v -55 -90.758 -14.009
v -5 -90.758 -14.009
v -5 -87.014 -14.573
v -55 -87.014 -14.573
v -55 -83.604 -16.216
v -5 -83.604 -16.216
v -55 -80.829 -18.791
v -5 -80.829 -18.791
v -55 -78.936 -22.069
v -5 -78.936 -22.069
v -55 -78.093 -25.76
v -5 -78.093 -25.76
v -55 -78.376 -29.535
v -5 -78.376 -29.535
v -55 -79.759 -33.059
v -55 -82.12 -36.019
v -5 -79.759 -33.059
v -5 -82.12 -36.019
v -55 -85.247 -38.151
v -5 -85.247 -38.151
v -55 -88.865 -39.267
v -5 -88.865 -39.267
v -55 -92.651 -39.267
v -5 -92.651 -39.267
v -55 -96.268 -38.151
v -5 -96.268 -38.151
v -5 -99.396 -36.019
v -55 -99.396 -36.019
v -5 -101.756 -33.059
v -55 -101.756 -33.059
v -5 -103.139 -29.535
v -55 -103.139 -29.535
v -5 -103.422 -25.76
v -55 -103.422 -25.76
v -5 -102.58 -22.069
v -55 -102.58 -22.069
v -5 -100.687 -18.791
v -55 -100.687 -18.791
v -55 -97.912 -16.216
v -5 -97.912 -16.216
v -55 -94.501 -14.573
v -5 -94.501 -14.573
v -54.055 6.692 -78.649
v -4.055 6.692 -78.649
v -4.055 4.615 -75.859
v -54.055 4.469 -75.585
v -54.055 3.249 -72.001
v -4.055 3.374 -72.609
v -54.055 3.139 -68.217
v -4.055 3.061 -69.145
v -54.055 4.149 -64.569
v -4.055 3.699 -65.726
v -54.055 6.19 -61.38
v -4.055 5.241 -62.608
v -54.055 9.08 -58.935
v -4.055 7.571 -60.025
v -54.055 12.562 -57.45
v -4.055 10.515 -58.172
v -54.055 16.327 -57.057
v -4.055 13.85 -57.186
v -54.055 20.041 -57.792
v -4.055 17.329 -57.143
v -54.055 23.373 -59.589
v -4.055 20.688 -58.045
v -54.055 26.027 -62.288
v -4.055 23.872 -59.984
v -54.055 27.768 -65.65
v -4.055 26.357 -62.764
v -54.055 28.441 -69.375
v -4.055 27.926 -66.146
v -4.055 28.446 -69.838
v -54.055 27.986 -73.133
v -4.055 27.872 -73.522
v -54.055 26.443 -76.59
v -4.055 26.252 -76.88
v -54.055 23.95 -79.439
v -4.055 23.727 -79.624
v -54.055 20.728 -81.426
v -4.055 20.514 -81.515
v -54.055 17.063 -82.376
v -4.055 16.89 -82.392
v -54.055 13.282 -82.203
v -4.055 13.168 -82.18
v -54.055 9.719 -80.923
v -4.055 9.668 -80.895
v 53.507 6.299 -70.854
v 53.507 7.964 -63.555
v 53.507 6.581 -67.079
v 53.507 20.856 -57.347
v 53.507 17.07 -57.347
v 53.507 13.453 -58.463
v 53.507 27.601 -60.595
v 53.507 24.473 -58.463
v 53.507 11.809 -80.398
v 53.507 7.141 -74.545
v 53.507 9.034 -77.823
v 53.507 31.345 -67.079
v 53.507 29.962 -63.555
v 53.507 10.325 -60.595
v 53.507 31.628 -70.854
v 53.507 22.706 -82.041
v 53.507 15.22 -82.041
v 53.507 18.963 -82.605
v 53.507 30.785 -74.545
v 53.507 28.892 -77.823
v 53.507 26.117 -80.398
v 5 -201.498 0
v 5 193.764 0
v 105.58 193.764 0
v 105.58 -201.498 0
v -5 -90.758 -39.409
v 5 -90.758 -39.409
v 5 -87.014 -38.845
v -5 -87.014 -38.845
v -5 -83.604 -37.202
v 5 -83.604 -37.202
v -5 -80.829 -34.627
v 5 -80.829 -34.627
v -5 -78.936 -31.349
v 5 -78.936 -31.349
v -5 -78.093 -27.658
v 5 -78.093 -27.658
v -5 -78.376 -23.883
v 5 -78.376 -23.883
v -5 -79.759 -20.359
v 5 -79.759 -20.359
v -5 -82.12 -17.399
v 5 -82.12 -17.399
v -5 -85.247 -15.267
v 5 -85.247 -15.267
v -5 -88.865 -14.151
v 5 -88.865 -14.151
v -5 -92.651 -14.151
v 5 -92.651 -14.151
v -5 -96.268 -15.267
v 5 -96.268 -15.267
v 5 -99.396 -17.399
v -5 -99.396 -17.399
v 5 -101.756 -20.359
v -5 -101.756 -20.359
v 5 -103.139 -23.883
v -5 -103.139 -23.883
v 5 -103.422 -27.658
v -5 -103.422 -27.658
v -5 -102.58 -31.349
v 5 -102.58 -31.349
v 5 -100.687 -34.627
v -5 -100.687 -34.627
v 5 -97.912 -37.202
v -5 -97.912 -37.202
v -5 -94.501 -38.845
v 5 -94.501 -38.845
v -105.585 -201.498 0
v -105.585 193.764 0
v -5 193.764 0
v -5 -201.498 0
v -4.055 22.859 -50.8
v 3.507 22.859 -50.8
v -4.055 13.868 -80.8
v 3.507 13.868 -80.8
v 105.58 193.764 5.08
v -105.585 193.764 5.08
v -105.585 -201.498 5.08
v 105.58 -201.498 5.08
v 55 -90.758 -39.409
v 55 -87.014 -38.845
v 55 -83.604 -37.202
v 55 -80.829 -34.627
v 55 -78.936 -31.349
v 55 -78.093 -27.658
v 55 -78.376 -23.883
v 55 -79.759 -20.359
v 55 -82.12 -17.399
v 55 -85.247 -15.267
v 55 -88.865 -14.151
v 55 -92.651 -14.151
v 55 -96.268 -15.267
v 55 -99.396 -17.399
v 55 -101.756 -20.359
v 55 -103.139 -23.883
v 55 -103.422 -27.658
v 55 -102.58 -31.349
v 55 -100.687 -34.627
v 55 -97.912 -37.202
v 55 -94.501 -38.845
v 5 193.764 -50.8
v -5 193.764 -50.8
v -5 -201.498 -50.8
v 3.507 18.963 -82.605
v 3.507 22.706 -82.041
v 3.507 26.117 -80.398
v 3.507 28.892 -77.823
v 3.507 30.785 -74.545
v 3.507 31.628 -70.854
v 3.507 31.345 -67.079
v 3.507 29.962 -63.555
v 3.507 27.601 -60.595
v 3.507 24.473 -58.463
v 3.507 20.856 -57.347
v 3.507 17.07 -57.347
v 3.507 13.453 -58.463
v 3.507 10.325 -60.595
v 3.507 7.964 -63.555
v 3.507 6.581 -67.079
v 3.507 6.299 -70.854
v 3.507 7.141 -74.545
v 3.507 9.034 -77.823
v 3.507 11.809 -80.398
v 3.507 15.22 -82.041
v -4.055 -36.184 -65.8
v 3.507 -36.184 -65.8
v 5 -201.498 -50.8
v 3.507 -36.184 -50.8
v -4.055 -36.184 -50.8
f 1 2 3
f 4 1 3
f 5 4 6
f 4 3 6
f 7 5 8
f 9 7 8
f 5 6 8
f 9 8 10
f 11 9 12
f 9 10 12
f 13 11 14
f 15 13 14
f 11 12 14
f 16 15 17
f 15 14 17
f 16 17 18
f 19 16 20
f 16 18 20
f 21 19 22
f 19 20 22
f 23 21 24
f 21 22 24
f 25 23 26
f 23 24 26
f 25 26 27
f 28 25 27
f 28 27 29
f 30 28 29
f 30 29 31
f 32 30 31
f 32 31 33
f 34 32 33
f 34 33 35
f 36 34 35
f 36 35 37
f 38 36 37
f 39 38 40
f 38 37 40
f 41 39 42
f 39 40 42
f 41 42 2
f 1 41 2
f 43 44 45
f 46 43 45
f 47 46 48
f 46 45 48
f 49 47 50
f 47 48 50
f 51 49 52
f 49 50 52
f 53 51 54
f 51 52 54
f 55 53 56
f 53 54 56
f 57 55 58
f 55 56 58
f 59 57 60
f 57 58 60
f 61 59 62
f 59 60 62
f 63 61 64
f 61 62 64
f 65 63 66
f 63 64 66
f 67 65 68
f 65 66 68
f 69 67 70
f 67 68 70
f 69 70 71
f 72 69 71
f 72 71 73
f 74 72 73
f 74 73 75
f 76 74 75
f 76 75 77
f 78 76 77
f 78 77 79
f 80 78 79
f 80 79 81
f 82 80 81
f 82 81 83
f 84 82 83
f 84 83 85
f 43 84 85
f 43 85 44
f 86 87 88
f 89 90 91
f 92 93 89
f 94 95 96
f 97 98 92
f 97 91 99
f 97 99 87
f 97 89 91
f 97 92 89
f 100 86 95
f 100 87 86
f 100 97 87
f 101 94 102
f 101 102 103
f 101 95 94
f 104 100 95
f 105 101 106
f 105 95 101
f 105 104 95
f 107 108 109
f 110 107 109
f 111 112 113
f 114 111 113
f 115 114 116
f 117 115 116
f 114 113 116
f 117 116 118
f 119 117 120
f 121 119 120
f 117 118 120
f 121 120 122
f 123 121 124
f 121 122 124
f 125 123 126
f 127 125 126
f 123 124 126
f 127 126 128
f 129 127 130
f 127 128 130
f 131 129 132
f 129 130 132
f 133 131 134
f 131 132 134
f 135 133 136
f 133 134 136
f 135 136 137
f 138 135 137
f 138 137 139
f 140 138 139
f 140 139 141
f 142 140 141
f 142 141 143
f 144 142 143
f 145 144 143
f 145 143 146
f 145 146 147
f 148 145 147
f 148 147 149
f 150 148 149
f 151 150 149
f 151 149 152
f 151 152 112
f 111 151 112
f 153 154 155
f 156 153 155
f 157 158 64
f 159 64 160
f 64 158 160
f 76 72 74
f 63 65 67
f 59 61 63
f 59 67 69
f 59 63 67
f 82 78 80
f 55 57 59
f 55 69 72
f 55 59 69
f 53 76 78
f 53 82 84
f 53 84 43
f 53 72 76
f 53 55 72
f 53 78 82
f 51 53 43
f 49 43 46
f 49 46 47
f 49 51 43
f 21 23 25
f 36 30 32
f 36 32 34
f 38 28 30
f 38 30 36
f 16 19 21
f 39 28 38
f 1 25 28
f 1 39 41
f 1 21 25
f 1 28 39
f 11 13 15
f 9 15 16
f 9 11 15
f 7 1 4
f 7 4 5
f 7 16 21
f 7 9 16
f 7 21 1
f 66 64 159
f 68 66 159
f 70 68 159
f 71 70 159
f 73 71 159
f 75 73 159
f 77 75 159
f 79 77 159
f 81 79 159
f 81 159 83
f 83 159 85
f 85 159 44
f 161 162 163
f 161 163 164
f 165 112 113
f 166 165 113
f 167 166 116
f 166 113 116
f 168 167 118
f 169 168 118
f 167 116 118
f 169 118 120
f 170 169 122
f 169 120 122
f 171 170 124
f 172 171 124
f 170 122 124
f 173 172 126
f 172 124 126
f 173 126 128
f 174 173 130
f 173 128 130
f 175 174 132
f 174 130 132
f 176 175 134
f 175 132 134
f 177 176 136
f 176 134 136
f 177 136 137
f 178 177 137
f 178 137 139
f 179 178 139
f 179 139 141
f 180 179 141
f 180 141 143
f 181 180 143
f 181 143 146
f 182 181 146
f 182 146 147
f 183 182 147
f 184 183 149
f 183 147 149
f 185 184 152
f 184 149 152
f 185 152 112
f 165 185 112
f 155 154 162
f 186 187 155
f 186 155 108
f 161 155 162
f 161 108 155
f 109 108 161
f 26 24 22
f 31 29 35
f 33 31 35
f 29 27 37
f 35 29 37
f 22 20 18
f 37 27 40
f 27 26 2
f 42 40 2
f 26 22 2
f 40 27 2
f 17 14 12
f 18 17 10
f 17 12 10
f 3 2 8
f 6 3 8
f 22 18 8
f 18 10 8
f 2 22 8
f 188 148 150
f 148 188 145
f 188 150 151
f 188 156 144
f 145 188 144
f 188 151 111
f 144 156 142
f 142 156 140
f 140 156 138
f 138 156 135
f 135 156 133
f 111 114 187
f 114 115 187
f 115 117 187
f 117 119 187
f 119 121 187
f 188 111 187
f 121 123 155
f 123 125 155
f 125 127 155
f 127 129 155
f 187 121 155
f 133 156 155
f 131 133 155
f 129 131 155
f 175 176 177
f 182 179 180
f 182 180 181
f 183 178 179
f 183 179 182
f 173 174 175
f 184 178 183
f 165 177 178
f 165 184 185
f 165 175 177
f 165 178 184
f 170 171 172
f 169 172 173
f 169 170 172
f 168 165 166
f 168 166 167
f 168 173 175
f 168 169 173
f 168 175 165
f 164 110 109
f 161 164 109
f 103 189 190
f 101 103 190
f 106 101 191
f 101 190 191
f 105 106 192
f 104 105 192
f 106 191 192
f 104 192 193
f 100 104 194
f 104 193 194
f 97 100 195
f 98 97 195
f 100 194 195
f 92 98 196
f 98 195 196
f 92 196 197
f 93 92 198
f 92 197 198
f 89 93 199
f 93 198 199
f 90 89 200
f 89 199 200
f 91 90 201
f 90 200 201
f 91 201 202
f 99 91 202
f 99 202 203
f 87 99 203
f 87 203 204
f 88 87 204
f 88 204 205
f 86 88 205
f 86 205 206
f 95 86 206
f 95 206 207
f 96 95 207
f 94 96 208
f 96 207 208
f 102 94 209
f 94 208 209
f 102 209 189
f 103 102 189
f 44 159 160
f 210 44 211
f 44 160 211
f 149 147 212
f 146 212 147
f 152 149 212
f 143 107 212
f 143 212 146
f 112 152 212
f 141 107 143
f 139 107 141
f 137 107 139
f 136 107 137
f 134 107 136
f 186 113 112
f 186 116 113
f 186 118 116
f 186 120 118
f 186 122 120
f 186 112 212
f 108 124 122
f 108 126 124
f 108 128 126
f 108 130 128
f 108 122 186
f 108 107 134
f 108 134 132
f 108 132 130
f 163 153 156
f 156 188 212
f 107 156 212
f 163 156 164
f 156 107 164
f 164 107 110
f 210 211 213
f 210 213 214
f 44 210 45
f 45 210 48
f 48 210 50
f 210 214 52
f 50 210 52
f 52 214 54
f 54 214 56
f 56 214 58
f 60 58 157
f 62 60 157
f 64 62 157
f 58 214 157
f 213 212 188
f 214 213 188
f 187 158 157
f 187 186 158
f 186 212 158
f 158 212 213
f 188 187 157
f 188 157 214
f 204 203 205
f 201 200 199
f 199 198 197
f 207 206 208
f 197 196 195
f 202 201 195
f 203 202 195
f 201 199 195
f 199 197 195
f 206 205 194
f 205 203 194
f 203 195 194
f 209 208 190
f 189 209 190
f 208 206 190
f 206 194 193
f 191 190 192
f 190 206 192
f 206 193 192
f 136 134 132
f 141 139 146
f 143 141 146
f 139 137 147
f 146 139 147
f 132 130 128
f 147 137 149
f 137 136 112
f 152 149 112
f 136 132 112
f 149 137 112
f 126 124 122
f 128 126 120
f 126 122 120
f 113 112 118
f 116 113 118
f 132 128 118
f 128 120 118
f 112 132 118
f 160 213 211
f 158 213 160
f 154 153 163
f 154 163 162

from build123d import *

# Parameters (mm, degrees)
SKETCH1_W           = 211.164618672
SKETCH1_H           = 395.262656468
BOSS_EXTRUDE1_DEPTH = 5.08
SKETCH2_W           = 10
SKETCH2_H           = 395.262656468
BOSS_EXTRUDE2_DEPTH = 50.8
SKETCH3_R           = 12.7
CUT_EXTRUDE1_DEPTH  = 15
SKETCH5_W           = 7.562322901
SKETCH5_H           = 100.104165791
BOSS_EXTRUDE3_DEPTH = 30
CUT_EXTRUDE4_DEPTH  = 20
SKETCH13_R          = 12.7
BOSS_EXTRUDE4_DEPTH = 50
SKETCH15_R          = 12.7
BOSS_EXTRUDE5_DEPTH = 50
SKETCH16_R          = 12.7
BOSS_EXTRUDE6_DEPTH = 50
SKETCH17_R          = 12.7
BOSS_EXTRUDE7_DEPTH = 50


with BuildPart() as part:
    # Sketch1 → Boss-Extrude1 (new body)
    with BuildSketch(Plane.XY):
        with Locations((-0.002292742, -3.867122219)):
            Rectangle(SKETCH1_W, SKETCH1_H)
    extrude(amount=BOSS_EXTRUDE1_DEPTH)

    # Sketch2 → Boss-Extrude2 (add)
    with BuildSketch(Plane(origin=(0, 0, 0), x_dir=(-1, 0, 0), z_dir=(0, 0, -1))):
        with Locations((0, -3.867122219)):
            Rectangle(SKETCH2_W, SKETCH2_H)
    extrude(amount=BOSS_EXTRUDE2_DEPTH)

    # Sketch3 → Cut-Extrude1 (cut)
    with BuildSketch(Plane(origin=(5, 0, 0), x_dir=(0, 0, -1), z_dir=(1, 0, 0))):
        with Locations((26.709107081, -90.757809842)):
            Circle(SKETCH3_R)
    extrude(amount=-CUT_EXTRUDE1_DEPTH, mode=Mode.SUBTRACT)

    # Sketch5 → Boss-Extrude3 (add)
    with BuildSketch(Plane(origin=(0, 0, -50.8), x_dir=(-1, 0, 0), z_dir=(0, 0, -1))):
        with Locations((0.273809221, 13.868484909)):
            Rectangle(SKETCH5_W, SKETCH5_H)
    extrude(amount=BOSS_EXTRUDE3_DEPTH)

    # Sketch12 → Cut-Extrude4 (cut)
    with BuildSketch(Plane(origin=(3.50735223, 0, 0), x_dir=(0, 0, -1), z_dir=(1, 0, 0))):
        Polygon((80.8, 13.868484908), (65.8, -36.183597987), (80.8, -36.183597987), align=None)
        Polygon((50.8, 22.859119742), (80.8, 13.868484908), (80.8, 63.920567804), (50.8, 63.920567804), align=None)
    extrude(amount=-CUT_EXTRUDE4_DEPTH, mode=Mode.SUBTRACT)

    # Sketch13 → Boss-Extrude4 (add)
    with BuildSketch(Plane.ZY.offset(4.054970671)):
        with Locations(Location((-69.744112894, 15.746525461, 0), (0, 0, 225.477498296))):
            Circle(SKETCH13_R)
    extrude(amount=BOSS_EXTRUDE4_DEPTH)


with BuildPart() as body_2:
    # Sketch15 → Boss-Extrude5 (new body)
    with BuildSketch(Plane(origin=(3.50735223, 0, 0), x_dir=(0, 0, -1), z_dir=(1, 0, 0))):
        with Locations((69.904821155, 18.963016363)):
            Circle(SKETCH15_R)
    extrude(amount=BOSS_EXTRUDE5_DEPTH)


with BuildPart() as body_3:
    # Sketch16 → Boss-Extrude6 (new body)
    with BuildSketch(Plane(origin=(5, 0, 0), x_dir=(0, 0, -1), z_dir=(1, 0, 0))):
        with Locations((26.709107081, -90.757809842)):
            Circle(SKETCH16_R)
    extrude(amount=BOSS_EXTRUDE6_DEPTH)


with BuildPart() as body_4:
    # Sketch17 → Boss-Extrude7 (new body)
    with BuildSketch(Plane.ZY.offset(5)):
        with Locations((-26.709107081, -90.757809842)):
            Circle(SKETCH17_R)
    extrude(amount=BOSS_EXTRUDE7_DEPTH)


solid = Compound([part.part, body_2.part, body_3.part, body_4.part])
